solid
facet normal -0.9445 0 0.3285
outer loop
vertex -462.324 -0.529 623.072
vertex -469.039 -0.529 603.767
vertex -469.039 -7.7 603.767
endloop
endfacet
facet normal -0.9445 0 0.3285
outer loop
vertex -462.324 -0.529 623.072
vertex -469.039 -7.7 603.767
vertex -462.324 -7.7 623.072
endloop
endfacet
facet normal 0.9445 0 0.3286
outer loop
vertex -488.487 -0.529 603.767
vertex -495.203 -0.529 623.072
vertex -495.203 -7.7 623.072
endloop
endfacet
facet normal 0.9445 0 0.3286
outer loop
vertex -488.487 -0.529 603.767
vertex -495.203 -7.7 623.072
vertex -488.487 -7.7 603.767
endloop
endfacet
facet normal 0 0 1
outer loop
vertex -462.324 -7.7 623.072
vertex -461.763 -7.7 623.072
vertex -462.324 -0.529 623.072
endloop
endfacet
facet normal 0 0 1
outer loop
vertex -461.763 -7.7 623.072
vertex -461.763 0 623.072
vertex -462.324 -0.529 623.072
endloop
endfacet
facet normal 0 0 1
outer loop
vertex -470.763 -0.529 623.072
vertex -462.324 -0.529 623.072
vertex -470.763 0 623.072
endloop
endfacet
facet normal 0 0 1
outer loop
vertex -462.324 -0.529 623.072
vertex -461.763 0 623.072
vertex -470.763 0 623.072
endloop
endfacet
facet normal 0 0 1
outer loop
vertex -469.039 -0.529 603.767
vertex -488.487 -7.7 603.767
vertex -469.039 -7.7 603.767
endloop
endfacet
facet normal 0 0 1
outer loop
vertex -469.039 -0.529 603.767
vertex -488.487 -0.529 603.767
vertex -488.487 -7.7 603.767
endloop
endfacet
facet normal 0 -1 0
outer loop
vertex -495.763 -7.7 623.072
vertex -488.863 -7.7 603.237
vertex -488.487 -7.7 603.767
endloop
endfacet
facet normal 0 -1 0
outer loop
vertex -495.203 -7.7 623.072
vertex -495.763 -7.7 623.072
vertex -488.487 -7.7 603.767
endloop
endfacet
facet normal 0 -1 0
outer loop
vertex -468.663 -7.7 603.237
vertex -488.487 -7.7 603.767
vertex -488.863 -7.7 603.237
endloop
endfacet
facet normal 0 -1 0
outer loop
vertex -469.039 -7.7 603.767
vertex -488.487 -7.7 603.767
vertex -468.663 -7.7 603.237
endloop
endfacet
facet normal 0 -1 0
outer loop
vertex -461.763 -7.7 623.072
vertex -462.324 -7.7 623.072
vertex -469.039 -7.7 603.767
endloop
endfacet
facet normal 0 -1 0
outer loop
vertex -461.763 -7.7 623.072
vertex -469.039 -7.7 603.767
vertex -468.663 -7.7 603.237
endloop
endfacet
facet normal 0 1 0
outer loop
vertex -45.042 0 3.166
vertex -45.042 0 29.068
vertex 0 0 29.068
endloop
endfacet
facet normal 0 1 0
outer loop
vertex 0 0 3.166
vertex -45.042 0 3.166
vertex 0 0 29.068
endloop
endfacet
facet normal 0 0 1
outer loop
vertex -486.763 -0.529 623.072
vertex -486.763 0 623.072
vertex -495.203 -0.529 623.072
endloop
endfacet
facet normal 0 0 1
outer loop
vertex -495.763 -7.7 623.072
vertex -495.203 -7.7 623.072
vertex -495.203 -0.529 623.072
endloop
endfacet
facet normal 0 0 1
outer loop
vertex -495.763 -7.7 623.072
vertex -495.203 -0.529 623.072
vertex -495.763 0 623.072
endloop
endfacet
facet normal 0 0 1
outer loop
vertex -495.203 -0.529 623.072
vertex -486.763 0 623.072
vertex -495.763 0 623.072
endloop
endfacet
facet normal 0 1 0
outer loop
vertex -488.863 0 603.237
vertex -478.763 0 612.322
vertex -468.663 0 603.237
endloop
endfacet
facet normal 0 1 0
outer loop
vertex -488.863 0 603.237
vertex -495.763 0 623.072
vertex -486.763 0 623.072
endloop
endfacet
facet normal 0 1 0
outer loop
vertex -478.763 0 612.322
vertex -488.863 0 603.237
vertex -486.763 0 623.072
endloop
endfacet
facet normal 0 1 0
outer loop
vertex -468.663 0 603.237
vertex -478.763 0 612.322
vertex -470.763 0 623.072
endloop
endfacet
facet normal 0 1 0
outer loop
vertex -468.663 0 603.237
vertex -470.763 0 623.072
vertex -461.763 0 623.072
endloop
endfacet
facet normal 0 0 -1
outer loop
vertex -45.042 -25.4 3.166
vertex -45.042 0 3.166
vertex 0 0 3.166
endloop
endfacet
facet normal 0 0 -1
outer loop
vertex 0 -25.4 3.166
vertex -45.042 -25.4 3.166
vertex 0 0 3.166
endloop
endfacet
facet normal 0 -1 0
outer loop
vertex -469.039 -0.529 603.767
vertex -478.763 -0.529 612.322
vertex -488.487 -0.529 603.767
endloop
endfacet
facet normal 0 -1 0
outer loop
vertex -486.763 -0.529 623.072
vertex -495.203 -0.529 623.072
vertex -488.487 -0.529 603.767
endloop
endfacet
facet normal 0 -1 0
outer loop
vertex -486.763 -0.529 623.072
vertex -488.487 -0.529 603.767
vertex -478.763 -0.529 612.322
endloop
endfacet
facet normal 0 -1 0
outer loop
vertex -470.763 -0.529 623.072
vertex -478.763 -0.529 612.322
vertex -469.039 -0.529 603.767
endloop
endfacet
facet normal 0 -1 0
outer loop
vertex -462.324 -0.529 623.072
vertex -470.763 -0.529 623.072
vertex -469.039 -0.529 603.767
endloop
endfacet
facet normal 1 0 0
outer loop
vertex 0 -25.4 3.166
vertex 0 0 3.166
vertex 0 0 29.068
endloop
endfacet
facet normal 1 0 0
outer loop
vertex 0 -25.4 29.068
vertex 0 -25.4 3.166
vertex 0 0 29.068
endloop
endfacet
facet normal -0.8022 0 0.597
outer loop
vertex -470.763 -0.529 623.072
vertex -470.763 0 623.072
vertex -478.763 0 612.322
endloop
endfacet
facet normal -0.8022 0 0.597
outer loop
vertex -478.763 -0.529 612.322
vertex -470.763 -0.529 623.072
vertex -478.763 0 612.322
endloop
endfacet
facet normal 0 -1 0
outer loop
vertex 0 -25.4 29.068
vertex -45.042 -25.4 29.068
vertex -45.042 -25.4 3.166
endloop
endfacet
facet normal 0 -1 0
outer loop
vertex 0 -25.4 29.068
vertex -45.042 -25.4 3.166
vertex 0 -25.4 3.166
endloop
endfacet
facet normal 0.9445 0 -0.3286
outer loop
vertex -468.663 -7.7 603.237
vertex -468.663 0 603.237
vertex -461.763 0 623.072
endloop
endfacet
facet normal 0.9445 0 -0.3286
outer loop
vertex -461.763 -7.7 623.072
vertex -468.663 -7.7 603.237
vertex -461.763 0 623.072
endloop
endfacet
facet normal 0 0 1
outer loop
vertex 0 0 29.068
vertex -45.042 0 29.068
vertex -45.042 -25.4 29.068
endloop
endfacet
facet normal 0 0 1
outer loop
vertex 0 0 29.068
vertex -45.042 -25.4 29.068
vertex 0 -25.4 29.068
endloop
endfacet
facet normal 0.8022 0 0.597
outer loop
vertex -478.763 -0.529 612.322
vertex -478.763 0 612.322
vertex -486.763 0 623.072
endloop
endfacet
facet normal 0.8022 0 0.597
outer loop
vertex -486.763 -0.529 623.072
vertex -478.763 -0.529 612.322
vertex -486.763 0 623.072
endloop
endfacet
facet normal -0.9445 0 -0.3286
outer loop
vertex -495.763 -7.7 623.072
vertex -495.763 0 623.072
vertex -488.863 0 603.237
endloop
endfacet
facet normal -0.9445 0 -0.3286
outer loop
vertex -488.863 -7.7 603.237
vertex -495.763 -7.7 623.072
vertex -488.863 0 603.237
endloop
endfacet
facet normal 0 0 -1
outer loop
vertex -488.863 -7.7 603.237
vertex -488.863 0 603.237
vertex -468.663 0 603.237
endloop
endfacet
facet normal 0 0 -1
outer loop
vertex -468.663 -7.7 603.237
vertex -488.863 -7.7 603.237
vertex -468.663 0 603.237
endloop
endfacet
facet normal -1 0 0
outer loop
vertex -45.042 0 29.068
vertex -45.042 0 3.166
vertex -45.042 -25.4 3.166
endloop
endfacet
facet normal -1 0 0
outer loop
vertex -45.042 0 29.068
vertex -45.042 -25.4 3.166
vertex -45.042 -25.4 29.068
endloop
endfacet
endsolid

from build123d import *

# Parameters (mm, degrees)
F0_W     = 45.042336
F0_H     = 25.902518
F1_DEPTH = 25.4
F3_DEPTH = 7.7
F4_T     = -0.5293


with BuildPart() as f1:
    # F0 (on Front) → F1 (new body)
    with BuildSketch(Plane.XZ):
        with Locations((-22.521168, 16.117122)):
            Rectangle(F0_W, F0_H)
    extrude(amount=F1_DEPTH)


with BuildPart() as f3:
    # F2 (on Front) → F3 (new body)
    with BuildSketch(Plane.XZ):
        Polygon((-495.763165, 623.071543), (-488.863165, 603.237481), (-468.663165, 603.237481), (-461.763165, 623.071543), (-470.763165, 623.071543), (-478.763165, 612.321659), (-486.763165, 623.071543), align=None)
    extrude(amount=F3_DEPTH)

    # F4
    f4_openings = [f3.faces().sort_by_distance(p)[0] for p in [
        (-466.263165, -3.85, 623.071543),
        (-474.763165, -3.85, 617.696601),
        (-465.584933, -7.7, 613.283845),
        (-491.263165, -3.85, 623.071543),
        (-482.763165, -3.85, 617.696601),
    ]]
    offset(amount=F4_T, openings=f4_openings)


solid = Compound([f1.part, f3.part])
